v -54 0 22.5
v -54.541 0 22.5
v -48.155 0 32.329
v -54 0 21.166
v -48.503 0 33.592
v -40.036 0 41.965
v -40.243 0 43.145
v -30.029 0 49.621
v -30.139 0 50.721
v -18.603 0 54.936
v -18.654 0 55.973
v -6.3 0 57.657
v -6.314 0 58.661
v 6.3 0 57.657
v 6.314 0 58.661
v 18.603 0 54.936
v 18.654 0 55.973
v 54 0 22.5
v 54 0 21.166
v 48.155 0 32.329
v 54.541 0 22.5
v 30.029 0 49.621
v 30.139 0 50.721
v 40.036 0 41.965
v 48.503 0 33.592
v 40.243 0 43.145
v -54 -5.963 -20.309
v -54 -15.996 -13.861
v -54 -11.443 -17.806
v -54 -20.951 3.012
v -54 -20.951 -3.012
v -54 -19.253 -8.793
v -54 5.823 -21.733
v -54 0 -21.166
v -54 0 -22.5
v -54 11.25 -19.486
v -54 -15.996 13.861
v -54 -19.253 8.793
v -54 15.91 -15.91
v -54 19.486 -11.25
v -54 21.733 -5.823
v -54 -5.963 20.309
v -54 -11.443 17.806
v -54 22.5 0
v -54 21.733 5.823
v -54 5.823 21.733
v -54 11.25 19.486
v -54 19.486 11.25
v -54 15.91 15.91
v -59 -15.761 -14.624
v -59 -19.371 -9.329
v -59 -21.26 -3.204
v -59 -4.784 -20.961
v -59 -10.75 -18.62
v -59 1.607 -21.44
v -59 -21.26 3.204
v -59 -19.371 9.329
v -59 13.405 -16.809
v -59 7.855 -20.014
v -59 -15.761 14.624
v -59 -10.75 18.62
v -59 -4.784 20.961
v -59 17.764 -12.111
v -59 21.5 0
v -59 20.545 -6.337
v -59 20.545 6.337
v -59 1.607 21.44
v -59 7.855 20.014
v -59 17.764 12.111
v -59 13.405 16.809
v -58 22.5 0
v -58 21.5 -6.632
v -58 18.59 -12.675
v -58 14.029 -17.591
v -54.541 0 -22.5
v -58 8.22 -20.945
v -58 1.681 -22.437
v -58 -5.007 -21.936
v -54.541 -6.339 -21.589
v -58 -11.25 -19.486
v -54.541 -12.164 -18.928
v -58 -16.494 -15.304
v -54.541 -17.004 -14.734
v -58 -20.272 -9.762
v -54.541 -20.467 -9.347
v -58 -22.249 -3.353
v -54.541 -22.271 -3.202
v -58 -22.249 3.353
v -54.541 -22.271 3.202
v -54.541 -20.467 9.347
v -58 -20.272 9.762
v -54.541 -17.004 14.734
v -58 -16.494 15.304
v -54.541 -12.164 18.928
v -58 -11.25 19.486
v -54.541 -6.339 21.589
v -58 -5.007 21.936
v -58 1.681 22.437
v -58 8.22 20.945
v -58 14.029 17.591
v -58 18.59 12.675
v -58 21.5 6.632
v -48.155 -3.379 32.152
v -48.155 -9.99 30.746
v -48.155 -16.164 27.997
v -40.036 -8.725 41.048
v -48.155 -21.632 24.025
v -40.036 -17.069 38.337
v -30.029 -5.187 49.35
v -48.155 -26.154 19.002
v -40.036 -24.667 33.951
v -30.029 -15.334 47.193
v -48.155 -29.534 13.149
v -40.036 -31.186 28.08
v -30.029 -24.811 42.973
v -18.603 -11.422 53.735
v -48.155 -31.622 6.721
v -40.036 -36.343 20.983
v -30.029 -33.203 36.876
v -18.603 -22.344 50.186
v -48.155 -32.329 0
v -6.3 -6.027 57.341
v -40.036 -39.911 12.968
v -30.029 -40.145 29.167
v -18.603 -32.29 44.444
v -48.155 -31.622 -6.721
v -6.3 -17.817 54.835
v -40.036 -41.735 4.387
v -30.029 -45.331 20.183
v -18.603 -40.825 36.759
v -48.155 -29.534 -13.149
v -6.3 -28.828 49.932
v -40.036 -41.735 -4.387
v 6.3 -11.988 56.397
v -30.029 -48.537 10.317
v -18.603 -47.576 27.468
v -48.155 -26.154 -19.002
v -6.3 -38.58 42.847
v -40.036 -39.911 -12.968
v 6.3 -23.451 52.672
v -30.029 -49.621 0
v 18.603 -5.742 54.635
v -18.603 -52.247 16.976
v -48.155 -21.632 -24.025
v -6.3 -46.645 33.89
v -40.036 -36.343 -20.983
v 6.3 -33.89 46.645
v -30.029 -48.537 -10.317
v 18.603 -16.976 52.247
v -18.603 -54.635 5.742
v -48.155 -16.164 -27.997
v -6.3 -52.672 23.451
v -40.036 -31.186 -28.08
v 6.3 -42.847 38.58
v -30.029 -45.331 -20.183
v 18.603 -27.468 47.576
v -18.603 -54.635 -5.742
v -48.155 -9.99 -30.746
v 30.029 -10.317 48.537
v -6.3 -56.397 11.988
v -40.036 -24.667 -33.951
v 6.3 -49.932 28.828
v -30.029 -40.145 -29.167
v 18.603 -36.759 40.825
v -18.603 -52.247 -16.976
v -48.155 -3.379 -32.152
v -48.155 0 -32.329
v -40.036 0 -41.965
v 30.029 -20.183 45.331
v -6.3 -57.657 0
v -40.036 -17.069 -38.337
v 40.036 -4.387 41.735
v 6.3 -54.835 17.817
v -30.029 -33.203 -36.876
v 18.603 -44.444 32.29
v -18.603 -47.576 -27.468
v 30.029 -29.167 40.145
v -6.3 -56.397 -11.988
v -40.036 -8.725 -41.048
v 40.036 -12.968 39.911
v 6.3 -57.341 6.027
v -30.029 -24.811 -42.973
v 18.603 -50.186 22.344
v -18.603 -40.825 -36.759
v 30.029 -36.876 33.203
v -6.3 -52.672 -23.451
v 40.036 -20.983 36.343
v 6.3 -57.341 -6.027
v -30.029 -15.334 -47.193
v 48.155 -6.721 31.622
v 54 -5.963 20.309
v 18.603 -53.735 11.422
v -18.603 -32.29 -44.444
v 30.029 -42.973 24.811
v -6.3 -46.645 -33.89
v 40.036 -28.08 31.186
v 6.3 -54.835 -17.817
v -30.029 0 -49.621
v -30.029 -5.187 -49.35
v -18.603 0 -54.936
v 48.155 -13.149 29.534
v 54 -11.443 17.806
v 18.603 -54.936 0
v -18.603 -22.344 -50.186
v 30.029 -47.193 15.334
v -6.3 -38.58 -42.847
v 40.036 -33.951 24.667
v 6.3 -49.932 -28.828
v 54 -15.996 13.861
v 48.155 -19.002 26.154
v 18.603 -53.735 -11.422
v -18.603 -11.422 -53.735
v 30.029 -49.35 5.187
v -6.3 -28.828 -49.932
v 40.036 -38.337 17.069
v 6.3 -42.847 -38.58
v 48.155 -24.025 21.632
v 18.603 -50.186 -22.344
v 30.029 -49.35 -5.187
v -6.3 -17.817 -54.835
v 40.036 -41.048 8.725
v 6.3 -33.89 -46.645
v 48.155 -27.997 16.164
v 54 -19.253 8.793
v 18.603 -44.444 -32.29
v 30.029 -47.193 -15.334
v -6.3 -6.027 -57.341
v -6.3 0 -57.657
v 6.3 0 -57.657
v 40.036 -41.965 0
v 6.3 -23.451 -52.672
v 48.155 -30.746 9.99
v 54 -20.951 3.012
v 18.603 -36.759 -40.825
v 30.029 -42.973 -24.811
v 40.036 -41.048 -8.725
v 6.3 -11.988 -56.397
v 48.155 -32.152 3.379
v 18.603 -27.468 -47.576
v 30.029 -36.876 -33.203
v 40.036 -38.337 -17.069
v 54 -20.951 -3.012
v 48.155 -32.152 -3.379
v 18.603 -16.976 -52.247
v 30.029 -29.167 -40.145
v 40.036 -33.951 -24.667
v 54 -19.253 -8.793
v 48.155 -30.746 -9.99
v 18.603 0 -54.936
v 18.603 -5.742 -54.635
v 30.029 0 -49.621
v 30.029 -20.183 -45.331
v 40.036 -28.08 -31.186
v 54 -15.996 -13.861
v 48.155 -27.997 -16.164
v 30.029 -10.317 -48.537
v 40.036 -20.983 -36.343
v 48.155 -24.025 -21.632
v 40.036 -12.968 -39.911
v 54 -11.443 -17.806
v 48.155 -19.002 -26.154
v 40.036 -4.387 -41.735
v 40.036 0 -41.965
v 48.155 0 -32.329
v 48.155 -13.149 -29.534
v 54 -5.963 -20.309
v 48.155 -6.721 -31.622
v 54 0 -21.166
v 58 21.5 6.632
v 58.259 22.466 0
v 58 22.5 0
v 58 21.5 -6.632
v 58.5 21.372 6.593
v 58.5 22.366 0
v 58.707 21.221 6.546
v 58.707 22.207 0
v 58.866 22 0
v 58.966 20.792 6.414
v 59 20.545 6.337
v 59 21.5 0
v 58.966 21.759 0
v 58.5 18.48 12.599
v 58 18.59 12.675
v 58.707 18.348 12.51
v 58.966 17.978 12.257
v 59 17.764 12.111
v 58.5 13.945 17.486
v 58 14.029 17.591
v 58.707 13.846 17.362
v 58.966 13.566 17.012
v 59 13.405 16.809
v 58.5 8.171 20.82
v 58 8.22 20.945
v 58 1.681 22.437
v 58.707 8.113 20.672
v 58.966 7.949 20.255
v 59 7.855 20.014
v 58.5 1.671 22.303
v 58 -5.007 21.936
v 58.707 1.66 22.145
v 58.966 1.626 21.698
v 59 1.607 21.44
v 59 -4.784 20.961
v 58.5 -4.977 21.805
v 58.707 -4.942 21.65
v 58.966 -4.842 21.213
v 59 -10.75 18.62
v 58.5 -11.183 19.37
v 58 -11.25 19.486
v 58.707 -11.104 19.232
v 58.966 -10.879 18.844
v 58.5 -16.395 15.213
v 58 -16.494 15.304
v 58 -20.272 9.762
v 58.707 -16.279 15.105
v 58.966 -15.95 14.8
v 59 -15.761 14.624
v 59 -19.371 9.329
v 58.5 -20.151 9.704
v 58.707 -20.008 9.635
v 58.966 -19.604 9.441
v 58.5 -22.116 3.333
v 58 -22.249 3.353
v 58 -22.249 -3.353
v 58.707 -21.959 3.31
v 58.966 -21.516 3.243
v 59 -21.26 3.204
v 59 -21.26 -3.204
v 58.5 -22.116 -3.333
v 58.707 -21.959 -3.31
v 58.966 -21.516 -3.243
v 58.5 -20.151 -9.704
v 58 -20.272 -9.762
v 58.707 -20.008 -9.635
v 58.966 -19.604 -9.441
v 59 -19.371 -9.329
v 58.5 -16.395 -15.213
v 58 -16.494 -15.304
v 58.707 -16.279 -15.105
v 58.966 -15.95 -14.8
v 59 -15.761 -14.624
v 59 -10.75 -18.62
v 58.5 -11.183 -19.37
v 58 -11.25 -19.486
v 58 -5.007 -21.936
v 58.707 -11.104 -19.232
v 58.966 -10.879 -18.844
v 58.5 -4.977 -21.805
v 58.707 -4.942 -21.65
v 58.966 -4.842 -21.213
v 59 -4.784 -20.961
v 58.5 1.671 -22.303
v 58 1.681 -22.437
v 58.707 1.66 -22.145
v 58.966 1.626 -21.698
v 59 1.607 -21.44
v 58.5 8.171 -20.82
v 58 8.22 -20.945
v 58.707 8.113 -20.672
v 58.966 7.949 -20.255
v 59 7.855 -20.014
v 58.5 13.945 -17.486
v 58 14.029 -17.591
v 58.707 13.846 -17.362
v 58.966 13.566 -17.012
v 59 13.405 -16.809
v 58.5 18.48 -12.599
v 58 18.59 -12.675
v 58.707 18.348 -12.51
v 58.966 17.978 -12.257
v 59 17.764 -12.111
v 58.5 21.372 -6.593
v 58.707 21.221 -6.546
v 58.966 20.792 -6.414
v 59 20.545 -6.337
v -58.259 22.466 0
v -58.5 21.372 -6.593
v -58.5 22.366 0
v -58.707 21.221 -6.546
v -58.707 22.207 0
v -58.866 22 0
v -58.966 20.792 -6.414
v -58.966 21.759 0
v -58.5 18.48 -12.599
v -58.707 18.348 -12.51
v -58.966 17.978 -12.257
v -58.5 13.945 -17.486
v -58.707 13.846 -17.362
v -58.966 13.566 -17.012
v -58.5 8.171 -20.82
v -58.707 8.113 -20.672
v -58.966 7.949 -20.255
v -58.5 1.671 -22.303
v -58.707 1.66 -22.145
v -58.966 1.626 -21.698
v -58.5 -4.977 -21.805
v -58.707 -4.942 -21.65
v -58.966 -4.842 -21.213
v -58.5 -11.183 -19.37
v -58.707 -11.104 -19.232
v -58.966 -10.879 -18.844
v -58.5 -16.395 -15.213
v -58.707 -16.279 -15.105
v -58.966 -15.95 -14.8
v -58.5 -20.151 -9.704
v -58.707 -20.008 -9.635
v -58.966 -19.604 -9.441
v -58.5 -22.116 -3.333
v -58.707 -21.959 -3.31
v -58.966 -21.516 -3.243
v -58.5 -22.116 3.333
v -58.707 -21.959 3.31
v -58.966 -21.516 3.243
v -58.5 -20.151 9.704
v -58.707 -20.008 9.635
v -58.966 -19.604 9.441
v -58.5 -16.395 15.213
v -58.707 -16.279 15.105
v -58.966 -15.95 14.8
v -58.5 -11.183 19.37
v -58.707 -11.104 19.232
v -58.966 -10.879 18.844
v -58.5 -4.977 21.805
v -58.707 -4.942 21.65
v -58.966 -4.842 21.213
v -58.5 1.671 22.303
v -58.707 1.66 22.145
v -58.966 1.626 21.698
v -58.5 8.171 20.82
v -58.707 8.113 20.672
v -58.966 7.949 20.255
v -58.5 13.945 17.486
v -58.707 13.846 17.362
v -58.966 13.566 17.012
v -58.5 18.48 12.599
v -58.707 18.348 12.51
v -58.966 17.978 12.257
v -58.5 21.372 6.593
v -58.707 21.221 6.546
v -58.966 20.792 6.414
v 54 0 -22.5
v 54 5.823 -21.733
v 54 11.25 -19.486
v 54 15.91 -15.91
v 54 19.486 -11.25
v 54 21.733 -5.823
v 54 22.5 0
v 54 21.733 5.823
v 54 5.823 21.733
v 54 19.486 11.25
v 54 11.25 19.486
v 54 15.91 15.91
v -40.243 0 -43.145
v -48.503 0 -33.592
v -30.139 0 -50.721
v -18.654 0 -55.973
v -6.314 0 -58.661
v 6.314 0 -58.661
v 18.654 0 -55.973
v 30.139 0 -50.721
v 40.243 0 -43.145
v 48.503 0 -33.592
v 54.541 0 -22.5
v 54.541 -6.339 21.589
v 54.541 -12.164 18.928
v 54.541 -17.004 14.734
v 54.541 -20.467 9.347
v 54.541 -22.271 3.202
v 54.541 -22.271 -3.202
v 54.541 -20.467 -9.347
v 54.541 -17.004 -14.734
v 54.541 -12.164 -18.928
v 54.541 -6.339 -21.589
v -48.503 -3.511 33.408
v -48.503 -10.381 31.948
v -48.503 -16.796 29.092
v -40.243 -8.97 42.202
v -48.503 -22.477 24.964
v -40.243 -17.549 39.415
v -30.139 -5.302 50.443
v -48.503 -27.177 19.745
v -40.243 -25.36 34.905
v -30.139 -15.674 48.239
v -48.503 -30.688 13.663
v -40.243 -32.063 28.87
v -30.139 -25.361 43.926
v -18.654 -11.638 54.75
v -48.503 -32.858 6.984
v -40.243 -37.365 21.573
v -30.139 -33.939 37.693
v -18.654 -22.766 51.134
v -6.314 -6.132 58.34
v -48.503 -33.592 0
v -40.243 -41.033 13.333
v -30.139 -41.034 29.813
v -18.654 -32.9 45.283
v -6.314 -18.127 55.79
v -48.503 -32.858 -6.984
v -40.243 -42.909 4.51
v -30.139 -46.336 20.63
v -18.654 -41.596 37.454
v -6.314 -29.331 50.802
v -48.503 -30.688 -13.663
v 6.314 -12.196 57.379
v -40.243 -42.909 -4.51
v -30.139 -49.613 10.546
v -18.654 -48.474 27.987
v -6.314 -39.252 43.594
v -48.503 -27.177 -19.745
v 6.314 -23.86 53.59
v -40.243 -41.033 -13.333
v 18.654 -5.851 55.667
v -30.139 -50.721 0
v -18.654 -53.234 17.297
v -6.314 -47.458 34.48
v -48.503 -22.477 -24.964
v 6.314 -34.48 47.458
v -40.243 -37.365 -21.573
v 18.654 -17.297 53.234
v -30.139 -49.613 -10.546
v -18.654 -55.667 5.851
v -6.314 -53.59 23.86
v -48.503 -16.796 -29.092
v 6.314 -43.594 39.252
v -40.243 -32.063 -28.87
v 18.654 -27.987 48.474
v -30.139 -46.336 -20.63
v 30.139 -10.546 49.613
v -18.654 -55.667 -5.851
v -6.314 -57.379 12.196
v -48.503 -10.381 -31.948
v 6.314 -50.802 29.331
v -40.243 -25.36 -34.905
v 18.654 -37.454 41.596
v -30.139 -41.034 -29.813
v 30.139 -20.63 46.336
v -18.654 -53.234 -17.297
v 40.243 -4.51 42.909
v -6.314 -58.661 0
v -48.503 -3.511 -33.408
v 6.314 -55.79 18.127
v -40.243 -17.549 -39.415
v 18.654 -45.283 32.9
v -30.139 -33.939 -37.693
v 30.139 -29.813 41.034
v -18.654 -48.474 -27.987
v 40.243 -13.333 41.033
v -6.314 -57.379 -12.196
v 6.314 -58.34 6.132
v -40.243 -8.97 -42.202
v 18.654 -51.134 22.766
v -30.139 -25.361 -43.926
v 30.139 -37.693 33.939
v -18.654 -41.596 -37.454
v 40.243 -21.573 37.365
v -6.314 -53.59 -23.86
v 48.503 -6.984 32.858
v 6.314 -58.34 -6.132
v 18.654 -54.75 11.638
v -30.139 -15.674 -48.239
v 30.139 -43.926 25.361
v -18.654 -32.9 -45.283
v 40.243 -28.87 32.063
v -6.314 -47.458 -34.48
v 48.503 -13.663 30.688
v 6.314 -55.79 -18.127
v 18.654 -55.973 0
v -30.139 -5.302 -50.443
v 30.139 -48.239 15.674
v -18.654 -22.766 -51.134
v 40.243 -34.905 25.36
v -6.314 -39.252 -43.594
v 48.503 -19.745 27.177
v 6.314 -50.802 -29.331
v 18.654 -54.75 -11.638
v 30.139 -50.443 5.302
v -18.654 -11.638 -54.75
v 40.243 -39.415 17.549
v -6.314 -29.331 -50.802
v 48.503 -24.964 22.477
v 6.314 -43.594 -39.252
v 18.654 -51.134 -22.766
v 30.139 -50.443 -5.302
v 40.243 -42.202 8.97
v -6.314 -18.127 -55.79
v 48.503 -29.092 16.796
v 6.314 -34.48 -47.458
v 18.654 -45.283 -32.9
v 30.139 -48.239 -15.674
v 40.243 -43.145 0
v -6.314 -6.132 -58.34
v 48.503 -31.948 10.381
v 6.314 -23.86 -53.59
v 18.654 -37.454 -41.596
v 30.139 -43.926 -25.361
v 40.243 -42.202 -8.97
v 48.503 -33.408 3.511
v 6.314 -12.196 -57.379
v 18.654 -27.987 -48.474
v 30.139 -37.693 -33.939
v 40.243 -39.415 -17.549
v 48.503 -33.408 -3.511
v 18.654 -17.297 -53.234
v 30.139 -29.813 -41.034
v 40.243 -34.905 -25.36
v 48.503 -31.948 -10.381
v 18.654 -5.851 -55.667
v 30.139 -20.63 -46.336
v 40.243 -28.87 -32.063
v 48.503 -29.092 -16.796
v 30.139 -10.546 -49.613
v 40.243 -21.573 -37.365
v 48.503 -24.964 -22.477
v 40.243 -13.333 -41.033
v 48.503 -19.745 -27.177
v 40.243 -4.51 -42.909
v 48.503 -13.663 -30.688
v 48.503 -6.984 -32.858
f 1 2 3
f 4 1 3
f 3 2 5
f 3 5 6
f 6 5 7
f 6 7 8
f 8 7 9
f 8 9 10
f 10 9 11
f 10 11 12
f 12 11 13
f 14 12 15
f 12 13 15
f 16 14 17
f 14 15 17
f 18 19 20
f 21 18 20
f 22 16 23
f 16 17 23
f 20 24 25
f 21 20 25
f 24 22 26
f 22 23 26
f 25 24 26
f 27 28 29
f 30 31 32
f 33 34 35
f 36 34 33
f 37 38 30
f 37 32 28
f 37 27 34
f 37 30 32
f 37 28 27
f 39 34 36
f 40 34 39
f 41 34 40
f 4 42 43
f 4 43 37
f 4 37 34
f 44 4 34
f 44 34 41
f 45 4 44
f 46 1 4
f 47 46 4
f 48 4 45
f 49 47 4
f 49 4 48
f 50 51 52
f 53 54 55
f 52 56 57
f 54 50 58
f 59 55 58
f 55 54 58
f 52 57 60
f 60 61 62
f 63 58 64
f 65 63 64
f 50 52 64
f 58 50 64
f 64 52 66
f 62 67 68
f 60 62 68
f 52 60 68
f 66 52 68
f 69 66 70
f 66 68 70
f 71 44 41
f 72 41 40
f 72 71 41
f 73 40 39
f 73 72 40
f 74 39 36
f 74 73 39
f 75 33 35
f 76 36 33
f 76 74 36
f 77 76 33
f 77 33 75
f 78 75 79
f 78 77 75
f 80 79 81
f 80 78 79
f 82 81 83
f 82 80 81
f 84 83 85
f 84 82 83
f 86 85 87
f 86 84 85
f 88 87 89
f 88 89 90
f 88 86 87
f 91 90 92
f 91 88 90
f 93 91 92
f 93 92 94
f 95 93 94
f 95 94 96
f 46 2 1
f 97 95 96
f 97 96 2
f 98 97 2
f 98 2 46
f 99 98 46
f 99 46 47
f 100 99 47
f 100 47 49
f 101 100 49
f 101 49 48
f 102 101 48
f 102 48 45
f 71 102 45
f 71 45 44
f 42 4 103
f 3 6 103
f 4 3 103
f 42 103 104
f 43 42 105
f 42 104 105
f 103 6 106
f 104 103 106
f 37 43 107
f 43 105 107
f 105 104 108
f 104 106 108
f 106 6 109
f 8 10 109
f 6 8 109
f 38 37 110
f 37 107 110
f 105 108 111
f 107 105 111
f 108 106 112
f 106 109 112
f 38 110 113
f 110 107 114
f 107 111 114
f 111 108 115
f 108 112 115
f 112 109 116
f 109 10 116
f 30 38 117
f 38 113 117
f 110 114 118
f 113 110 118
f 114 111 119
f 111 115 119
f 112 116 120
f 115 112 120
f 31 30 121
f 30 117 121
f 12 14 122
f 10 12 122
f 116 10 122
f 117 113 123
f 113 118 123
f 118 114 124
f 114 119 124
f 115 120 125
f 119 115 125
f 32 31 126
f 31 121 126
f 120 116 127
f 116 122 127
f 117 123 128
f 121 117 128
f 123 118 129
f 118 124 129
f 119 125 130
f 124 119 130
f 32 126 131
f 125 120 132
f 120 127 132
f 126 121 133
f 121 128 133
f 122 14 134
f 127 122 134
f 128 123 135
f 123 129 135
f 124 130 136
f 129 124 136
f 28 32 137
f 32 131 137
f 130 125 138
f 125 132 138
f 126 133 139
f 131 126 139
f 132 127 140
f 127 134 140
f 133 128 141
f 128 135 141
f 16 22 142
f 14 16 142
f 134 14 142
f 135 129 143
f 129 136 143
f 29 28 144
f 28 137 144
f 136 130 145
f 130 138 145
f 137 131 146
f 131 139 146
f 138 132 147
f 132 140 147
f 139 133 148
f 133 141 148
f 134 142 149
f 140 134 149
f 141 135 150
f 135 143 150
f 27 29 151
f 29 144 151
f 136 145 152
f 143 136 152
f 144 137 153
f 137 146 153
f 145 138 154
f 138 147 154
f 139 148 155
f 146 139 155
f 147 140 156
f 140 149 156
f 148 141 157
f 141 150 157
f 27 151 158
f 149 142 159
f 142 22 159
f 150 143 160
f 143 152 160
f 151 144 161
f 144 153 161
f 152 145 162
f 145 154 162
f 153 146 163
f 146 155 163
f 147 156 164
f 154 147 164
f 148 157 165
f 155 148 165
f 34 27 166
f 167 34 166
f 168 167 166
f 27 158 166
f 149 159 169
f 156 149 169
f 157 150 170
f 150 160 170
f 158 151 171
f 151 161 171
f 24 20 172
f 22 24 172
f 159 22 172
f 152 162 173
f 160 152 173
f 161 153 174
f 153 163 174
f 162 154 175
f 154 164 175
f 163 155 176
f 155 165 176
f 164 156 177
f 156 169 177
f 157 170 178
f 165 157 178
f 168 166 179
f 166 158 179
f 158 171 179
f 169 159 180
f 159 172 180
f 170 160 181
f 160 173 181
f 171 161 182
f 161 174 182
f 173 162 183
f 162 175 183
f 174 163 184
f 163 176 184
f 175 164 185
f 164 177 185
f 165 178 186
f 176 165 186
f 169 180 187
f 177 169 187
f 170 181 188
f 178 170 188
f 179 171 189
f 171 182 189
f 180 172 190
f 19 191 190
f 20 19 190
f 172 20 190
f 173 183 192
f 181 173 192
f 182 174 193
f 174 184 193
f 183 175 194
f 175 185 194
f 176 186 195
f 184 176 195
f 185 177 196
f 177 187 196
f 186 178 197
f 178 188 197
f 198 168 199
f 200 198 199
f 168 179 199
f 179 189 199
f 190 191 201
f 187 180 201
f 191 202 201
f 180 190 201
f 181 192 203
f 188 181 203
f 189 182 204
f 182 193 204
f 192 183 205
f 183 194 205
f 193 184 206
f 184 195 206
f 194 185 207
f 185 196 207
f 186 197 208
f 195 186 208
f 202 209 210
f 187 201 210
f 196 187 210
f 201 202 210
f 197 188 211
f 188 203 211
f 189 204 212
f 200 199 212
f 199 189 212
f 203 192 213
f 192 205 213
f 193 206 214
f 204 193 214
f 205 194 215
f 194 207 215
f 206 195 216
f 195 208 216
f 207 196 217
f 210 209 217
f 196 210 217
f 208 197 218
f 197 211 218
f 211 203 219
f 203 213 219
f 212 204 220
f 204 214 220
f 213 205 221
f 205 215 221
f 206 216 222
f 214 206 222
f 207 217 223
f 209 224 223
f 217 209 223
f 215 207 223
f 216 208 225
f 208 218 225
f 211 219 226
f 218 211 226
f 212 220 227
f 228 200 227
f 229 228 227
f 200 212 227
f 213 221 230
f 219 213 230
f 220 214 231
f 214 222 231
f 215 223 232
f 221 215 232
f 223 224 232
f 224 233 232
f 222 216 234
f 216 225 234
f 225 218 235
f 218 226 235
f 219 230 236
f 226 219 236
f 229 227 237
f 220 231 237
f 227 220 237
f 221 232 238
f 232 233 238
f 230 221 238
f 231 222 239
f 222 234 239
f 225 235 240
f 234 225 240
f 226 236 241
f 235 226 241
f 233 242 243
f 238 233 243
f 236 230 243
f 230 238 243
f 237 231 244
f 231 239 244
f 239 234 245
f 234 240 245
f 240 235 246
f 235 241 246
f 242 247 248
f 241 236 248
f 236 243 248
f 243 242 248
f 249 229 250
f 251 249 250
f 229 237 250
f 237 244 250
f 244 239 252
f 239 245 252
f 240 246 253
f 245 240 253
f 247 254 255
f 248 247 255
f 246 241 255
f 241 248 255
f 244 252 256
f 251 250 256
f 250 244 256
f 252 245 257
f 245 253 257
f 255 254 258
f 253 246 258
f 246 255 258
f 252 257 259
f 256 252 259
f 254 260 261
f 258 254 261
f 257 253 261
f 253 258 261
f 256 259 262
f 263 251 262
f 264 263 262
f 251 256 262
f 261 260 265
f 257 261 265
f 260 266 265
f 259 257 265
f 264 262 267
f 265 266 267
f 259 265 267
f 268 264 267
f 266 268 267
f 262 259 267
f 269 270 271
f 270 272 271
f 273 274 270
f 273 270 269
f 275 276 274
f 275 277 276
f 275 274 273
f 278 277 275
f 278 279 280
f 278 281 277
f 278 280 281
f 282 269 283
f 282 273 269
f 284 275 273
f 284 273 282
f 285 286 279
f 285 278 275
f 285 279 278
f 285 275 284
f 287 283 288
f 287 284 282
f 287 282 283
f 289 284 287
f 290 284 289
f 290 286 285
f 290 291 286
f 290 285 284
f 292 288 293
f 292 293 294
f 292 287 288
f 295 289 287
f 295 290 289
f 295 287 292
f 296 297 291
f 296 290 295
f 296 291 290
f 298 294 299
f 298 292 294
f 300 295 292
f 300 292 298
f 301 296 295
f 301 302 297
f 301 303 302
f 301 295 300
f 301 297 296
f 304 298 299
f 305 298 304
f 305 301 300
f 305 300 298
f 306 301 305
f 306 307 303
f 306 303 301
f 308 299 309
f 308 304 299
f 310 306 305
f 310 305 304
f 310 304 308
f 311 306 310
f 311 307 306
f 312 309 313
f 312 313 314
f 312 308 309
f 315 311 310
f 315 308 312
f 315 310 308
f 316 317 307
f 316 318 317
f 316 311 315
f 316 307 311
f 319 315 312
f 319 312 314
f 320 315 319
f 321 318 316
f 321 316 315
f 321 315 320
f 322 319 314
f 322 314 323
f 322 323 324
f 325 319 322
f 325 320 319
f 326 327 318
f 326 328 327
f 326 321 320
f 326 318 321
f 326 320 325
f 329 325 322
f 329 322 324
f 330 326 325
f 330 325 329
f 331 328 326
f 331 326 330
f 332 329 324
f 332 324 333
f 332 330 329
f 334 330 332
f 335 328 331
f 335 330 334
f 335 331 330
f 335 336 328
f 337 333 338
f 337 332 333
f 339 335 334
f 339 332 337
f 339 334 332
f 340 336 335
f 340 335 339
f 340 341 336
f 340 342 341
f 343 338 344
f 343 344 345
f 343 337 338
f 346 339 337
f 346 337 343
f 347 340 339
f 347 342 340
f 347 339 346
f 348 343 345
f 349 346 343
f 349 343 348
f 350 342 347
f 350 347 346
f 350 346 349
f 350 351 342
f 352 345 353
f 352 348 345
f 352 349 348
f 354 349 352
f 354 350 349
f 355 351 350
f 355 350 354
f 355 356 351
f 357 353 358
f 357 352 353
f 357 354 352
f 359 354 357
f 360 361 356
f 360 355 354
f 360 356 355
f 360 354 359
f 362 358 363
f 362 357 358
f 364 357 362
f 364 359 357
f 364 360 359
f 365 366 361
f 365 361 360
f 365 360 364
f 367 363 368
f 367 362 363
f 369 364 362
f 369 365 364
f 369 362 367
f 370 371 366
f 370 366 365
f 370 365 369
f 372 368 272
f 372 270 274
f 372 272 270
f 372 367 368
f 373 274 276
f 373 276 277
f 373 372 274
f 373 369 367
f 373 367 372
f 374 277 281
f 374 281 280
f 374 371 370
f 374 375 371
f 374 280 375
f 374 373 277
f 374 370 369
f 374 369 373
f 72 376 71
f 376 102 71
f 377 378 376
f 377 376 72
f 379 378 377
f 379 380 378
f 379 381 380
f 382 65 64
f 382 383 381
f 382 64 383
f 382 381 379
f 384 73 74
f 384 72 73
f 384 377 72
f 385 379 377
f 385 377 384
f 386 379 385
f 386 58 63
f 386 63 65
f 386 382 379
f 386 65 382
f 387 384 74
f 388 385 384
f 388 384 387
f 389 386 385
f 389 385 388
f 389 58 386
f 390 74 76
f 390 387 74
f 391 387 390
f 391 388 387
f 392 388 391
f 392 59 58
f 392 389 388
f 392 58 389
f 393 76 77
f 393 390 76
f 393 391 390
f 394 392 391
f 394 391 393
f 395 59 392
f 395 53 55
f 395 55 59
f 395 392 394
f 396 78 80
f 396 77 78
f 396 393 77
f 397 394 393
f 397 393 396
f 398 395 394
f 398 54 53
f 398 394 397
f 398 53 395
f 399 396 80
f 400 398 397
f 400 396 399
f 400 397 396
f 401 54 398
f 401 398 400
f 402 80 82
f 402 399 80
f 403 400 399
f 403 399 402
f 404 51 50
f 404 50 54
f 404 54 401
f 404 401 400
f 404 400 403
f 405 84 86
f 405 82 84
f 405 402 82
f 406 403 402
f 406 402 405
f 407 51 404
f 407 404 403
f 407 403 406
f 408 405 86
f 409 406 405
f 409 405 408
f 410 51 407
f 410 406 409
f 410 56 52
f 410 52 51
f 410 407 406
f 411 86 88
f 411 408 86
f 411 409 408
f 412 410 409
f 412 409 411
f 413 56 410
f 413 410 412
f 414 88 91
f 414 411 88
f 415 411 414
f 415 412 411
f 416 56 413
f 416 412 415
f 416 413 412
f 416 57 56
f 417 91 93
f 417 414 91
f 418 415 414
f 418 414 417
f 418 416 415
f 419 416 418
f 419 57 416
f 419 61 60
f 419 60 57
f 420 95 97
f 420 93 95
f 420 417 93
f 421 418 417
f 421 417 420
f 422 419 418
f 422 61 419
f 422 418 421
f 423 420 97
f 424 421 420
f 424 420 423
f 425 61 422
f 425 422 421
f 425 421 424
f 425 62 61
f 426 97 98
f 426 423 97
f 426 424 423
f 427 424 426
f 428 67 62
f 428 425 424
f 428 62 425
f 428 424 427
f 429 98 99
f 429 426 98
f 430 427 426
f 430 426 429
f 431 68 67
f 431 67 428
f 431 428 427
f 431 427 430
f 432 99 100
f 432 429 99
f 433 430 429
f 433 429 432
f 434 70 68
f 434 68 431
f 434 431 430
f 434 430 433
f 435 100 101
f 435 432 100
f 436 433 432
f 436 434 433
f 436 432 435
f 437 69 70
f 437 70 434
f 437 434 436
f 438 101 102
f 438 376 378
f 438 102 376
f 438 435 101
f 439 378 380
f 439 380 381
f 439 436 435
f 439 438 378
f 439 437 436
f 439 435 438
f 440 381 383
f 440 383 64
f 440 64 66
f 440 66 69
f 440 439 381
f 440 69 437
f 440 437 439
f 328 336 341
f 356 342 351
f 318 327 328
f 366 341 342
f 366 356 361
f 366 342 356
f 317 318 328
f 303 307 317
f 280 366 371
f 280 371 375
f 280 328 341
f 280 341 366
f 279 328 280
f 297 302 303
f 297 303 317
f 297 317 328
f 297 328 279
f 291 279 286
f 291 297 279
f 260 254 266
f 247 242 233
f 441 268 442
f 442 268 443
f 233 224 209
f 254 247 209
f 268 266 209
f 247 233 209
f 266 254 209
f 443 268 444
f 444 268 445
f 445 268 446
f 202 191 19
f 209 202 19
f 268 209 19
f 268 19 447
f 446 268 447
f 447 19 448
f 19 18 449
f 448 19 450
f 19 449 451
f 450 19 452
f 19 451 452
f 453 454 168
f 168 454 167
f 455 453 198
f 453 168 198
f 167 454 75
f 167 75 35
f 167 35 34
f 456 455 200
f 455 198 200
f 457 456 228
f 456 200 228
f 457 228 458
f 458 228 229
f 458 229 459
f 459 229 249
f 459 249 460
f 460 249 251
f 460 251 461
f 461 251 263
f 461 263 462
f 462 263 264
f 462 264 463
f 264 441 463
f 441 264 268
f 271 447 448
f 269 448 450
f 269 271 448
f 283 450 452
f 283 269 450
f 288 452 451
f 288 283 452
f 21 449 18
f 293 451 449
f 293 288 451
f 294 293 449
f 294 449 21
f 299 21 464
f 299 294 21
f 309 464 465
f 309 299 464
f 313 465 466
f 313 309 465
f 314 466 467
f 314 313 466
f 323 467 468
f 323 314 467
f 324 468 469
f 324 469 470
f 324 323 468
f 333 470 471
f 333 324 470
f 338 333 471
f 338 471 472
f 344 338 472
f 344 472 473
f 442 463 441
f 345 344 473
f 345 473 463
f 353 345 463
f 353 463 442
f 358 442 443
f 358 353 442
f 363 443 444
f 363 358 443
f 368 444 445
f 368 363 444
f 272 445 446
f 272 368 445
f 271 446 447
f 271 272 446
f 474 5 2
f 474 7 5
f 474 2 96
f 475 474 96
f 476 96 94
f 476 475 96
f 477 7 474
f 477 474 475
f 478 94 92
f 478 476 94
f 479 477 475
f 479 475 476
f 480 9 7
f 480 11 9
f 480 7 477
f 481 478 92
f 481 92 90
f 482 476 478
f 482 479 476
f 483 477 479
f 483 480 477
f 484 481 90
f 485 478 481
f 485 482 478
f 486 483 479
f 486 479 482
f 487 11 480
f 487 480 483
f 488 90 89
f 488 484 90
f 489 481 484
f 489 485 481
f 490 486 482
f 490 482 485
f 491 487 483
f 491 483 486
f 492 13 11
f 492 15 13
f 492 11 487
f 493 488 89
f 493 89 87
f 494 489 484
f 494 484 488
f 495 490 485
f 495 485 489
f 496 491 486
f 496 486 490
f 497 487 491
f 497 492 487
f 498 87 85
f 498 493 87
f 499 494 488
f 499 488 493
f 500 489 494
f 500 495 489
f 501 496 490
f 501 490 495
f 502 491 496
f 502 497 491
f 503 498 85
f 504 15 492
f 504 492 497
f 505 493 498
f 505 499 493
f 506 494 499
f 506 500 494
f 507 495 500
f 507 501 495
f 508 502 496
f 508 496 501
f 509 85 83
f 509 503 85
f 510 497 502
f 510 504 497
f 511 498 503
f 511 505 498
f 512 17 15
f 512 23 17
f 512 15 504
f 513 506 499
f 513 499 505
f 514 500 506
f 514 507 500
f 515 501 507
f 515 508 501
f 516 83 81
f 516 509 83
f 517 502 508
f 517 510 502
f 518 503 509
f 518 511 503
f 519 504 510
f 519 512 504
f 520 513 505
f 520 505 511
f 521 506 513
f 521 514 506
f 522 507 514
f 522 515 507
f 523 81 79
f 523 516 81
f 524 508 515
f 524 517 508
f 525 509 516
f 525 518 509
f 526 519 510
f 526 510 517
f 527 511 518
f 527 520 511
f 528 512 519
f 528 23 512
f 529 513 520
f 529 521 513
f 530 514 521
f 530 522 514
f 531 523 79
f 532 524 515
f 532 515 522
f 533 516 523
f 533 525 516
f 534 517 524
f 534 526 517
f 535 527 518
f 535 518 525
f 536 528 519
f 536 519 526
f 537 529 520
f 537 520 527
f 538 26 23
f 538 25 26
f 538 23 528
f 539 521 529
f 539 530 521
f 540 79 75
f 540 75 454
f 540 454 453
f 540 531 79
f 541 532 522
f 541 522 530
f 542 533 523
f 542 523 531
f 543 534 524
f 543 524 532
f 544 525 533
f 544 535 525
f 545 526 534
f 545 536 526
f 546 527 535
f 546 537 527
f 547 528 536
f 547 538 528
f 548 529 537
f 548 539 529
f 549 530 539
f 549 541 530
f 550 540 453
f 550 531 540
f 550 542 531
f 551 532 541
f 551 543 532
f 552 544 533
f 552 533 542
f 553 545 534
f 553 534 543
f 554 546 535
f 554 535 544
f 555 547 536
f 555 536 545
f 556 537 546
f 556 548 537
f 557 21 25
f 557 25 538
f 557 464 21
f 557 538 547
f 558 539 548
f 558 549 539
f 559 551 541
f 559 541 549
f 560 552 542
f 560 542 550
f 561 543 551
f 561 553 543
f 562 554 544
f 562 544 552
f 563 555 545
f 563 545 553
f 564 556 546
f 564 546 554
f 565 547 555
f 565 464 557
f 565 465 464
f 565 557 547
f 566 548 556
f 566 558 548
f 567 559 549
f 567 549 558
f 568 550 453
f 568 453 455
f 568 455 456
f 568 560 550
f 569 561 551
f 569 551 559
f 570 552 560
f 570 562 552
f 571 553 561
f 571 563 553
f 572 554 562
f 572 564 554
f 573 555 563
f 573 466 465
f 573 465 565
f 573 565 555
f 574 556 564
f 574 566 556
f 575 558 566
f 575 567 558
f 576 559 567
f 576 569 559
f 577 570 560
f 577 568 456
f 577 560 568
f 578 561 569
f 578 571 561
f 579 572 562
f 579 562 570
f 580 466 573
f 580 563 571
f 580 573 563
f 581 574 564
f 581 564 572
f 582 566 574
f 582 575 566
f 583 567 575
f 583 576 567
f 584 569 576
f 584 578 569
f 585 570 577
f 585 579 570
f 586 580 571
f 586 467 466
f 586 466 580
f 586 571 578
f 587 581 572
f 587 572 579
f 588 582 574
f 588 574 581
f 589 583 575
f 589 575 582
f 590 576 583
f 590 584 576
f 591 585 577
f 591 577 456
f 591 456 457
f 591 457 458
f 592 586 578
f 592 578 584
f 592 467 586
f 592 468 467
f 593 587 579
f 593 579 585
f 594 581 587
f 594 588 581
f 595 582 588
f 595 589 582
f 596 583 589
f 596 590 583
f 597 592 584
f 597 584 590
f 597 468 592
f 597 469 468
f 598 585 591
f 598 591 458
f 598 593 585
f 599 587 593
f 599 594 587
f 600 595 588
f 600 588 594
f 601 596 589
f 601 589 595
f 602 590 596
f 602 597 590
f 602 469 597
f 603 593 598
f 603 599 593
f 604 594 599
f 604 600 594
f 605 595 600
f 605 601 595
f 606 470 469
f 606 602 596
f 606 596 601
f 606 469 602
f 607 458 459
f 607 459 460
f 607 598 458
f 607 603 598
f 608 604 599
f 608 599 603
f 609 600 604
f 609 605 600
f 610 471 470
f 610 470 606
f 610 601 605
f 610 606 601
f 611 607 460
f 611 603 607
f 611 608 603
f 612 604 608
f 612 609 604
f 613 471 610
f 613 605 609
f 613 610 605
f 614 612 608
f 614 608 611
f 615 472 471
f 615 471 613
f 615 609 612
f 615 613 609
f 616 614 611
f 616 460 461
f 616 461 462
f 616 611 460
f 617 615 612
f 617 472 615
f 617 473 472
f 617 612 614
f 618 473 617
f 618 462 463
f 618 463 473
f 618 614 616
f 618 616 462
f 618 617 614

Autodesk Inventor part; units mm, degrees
sketch "Sketch1" plane through (0, 0, 0) normal (0, 0, 1) x (1, 0, 0)
  arc A0 (-59, 0) -> (59, 0) centre (0, 0) ccw
  arc A1 (-58, 0) -> (58, 0) centre (0, 0) ccw
  line L0 (-59, 0) -> (59, 0)
  dimension "d0" = 118
  dimension "d1" = 116
revolve "Revolution1" add sketch "Sketch1" angle 360 about axis through (-59, 0, 0) along (1, 0, 0) contours L0 A1 A0
ref_plane "Work Plane1" through (0, 0, 59) normal (0, 0, 1) x (1, 0, 0)
sketch "Sketch2" plane through (0, 0, 59) normal (0, 0, 1) x (1, 0, 0)
  circle A0 centre (0, 0) radius 59 projected
  line L0 (-59, 0) -> (59, 0)
extrude "Extrusion1" cut sketch "Sketch2" against normal through all contours L0 A0 picked at (13.5288, 25.207)
ref_plane "Work Plane2" through (-59, 0, 0) normal (1, 0, 0) x (0, 1, 0)
sketch "Sketch3" plane through (-59, 0, 0) normal (1, 0, 0) x (0, 1, 0)
  circle A0 centre (0, 0) radius 22.5
  dimension "d5" = 45
extrude "Extrusion2" add sketch "Sketch3" along normal blind 5
fillet "Fillet1" radius 1 1 edges at (-59, -22.5, 0)
ref_plane "Work Plane3" through (59, 0, 0) normal (1, 0, 0) x (0, 1, 0)
sketch "Sketch4" plane through (59, 0, 0) normal (1, 0, 0) x (0, 1, 0)
  circle A0 centre (0, 0) radius 22.5
  point P0 (0, 22.5)
extrude "Extrusion3" add sketch "Sketch4" against normal blind 5
fillet "Fillet2" radius 1 1 edges at (59, -22.5, 0)
properties part number "Head"
